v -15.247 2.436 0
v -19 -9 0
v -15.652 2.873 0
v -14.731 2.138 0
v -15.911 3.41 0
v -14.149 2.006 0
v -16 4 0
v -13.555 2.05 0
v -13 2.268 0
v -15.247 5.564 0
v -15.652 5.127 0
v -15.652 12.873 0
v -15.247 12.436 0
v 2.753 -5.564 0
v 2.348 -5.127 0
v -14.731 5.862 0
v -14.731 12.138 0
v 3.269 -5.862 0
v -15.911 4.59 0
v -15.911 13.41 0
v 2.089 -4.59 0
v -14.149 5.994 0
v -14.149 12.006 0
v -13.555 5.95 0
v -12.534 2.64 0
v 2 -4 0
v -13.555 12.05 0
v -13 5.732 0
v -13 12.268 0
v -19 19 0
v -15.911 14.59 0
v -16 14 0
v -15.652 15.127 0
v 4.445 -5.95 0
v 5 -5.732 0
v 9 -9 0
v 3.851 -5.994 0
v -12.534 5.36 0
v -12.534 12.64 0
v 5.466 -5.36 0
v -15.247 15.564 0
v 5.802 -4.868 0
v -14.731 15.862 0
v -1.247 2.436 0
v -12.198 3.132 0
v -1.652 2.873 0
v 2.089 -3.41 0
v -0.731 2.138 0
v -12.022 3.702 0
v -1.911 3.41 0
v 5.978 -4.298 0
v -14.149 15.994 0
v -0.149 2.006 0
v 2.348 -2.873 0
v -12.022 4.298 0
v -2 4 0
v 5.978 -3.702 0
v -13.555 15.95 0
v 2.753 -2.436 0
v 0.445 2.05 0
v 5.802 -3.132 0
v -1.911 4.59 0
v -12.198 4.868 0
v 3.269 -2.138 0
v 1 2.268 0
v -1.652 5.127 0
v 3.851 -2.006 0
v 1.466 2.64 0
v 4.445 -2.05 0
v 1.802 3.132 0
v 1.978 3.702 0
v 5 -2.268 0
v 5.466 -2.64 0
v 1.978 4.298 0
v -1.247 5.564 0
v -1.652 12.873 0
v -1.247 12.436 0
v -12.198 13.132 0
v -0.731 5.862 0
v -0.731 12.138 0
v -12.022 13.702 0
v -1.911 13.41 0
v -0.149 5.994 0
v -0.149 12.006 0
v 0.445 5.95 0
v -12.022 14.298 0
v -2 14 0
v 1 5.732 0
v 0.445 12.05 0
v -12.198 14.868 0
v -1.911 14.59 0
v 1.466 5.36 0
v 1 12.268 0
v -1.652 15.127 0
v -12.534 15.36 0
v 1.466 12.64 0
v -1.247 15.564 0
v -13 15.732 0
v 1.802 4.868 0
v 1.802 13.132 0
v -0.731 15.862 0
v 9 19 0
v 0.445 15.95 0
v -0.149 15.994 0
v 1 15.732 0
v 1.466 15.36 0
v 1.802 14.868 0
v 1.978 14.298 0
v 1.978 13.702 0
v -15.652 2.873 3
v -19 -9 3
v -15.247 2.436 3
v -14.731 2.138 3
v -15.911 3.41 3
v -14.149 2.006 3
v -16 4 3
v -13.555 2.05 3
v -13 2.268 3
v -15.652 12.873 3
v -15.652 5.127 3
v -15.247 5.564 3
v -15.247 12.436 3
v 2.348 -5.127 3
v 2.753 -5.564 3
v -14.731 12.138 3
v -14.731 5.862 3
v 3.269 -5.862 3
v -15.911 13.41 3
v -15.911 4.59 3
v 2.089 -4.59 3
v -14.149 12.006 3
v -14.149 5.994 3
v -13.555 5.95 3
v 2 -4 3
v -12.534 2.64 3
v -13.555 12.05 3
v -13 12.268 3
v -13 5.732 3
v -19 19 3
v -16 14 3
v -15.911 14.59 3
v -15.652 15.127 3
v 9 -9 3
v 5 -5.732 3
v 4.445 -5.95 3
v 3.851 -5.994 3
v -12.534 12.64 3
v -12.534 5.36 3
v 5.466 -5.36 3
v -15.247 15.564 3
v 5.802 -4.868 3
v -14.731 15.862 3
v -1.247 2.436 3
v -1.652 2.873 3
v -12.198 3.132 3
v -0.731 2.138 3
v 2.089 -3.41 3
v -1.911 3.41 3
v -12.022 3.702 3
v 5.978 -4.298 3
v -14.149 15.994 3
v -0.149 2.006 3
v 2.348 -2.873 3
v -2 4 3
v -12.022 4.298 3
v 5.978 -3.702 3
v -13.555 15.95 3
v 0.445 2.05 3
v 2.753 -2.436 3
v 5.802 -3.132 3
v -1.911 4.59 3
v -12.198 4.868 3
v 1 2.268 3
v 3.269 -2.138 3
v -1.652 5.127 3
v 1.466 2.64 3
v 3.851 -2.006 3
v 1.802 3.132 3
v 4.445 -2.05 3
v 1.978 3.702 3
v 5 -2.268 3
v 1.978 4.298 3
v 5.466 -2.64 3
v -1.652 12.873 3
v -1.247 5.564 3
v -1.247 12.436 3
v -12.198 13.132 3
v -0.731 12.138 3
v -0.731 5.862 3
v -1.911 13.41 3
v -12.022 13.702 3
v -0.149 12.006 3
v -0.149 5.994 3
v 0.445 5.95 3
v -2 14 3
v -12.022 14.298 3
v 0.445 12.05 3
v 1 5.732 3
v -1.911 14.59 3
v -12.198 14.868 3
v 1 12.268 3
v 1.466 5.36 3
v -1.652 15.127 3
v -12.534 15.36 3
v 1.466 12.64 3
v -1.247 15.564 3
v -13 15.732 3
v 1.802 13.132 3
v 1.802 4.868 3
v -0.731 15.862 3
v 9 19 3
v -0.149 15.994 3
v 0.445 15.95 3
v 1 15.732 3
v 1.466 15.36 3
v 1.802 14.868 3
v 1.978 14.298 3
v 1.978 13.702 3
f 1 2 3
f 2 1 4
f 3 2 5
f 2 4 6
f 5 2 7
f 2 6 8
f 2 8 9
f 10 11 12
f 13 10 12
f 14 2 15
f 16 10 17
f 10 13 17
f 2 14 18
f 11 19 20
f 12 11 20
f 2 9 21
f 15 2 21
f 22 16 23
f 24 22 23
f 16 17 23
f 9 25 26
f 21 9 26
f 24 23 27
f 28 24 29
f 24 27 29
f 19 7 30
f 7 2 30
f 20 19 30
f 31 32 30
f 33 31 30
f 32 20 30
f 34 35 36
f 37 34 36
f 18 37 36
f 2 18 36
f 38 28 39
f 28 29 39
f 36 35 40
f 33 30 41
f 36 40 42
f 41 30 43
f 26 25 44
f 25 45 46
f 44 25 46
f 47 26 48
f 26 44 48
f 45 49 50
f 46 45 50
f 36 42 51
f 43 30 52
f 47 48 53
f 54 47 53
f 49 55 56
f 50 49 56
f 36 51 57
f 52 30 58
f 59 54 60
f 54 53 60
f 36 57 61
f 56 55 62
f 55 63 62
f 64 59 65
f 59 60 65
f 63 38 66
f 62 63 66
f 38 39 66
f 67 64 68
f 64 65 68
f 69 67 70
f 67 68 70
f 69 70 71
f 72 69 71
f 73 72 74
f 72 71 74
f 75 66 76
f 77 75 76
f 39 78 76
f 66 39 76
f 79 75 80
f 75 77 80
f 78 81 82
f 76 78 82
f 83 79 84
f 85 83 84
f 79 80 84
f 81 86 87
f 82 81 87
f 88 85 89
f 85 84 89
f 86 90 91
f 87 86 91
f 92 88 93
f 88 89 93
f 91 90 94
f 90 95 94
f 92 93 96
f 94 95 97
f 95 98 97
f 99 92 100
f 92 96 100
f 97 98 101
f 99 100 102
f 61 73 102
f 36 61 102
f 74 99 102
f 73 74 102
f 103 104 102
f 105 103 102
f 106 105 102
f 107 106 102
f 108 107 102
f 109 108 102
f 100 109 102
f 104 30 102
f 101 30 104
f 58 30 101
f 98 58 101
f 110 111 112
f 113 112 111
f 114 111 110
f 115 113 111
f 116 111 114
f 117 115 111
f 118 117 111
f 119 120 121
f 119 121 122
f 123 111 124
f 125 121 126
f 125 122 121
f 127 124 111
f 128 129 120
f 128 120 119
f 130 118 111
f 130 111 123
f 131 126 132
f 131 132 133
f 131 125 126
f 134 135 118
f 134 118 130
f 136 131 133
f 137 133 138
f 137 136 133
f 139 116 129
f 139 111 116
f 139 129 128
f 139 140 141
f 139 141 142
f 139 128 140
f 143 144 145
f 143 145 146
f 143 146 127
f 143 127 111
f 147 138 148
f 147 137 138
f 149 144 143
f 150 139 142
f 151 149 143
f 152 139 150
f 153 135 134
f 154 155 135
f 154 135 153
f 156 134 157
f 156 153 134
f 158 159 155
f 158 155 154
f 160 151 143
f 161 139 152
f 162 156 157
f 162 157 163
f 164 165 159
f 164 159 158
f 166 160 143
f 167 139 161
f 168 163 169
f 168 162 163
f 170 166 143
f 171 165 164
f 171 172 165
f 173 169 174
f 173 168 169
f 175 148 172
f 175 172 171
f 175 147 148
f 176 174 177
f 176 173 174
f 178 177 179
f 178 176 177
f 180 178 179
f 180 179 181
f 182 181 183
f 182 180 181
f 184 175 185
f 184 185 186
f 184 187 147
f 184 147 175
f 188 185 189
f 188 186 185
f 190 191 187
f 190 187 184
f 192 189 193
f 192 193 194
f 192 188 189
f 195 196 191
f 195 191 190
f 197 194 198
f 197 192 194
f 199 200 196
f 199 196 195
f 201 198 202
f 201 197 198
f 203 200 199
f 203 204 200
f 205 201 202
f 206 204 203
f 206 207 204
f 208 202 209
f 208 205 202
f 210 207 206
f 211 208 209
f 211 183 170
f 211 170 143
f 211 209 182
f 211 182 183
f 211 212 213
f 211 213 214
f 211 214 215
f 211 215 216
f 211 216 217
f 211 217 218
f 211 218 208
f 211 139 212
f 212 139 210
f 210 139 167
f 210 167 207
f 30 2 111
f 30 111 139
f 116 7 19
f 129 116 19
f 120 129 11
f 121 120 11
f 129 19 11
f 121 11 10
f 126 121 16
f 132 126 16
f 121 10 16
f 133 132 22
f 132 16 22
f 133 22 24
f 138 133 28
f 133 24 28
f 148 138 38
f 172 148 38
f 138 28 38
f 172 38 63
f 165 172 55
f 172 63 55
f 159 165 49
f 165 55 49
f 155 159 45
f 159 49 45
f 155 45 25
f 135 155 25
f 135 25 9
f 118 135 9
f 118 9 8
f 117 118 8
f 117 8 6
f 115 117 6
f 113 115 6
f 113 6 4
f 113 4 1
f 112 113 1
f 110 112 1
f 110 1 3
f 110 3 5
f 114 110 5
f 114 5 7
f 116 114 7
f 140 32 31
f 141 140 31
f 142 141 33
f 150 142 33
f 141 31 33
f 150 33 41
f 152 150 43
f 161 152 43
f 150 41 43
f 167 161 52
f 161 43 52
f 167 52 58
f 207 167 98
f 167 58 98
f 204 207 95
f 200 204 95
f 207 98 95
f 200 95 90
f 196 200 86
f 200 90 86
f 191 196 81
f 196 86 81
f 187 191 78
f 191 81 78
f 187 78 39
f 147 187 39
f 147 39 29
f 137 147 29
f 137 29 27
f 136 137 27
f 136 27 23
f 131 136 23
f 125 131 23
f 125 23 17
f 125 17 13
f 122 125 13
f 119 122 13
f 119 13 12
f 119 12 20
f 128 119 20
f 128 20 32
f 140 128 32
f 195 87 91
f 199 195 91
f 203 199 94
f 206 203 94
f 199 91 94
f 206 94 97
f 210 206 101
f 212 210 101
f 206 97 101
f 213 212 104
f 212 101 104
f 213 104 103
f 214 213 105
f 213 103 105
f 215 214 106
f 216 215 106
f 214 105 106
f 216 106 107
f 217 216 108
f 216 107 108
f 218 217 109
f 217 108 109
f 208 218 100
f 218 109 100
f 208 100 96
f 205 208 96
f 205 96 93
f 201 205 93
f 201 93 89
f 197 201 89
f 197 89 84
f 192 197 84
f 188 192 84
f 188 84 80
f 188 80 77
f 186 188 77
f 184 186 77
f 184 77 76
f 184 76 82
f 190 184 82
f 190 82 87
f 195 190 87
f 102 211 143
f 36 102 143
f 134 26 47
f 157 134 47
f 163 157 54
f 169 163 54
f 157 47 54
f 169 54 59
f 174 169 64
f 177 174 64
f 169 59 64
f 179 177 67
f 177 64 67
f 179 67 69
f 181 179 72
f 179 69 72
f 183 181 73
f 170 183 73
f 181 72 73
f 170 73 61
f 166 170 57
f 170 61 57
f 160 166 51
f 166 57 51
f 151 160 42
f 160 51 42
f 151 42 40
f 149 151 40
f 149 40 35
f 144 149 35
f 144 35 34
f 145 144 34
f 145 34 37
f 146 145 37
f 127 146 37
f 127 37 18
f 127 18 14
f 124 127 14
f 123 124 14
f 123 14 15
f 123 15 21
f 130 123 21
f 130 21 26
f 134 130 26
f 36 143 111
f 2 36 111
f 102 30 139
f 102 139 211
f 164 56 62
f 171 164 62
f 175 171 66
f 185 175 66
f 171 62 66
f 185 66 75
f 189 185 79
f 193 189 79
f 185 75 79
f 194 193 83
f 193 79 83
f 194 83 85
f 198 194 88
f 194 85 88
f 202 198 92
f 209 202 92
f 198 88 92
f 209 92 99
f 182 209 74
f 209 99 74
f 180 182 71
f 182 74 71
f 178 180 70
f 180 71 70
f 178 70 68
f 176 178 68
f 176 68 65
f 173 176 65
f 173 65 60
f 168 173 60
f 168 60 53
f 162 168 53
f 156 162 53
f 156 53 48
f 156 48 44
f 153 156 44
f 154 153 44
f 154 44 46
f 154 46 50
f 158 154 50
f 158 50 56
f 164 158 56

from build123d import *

# Parameters (mm, degrees)
F0_W     = 38
F0_H     = 38
F1_DEPTH = 3
F3_D     = 4
F5_DEPTH = 25


with BuildPart() as f1:
    # F0 (on Top) → F1 (new body)
    with BuildSketch(Plane.XY):
        Rectangle(F0_W, F0_H)
    extrude(amount=F1_DEPTH)

    # F3 (through all)
    with Locations(Plane.XY.offset(3)):
        with Locations((0, 4), (0, 14), (-14, 14), (4, -4), (-14, 4)):
            Hole(F3_D / 2)

    # F4 (on face) → F5 (cut)
    with BuildSketch(Plane.XY.offset(3)):
        Polygon((19, 19), (9, 19), (9, -9), (-19, -9), (-19, -19), (19, -19), align=None)
    extrude(amount=-F5_DEPTH, mode=Mode.SUBTRACT)


solid = f1.part
